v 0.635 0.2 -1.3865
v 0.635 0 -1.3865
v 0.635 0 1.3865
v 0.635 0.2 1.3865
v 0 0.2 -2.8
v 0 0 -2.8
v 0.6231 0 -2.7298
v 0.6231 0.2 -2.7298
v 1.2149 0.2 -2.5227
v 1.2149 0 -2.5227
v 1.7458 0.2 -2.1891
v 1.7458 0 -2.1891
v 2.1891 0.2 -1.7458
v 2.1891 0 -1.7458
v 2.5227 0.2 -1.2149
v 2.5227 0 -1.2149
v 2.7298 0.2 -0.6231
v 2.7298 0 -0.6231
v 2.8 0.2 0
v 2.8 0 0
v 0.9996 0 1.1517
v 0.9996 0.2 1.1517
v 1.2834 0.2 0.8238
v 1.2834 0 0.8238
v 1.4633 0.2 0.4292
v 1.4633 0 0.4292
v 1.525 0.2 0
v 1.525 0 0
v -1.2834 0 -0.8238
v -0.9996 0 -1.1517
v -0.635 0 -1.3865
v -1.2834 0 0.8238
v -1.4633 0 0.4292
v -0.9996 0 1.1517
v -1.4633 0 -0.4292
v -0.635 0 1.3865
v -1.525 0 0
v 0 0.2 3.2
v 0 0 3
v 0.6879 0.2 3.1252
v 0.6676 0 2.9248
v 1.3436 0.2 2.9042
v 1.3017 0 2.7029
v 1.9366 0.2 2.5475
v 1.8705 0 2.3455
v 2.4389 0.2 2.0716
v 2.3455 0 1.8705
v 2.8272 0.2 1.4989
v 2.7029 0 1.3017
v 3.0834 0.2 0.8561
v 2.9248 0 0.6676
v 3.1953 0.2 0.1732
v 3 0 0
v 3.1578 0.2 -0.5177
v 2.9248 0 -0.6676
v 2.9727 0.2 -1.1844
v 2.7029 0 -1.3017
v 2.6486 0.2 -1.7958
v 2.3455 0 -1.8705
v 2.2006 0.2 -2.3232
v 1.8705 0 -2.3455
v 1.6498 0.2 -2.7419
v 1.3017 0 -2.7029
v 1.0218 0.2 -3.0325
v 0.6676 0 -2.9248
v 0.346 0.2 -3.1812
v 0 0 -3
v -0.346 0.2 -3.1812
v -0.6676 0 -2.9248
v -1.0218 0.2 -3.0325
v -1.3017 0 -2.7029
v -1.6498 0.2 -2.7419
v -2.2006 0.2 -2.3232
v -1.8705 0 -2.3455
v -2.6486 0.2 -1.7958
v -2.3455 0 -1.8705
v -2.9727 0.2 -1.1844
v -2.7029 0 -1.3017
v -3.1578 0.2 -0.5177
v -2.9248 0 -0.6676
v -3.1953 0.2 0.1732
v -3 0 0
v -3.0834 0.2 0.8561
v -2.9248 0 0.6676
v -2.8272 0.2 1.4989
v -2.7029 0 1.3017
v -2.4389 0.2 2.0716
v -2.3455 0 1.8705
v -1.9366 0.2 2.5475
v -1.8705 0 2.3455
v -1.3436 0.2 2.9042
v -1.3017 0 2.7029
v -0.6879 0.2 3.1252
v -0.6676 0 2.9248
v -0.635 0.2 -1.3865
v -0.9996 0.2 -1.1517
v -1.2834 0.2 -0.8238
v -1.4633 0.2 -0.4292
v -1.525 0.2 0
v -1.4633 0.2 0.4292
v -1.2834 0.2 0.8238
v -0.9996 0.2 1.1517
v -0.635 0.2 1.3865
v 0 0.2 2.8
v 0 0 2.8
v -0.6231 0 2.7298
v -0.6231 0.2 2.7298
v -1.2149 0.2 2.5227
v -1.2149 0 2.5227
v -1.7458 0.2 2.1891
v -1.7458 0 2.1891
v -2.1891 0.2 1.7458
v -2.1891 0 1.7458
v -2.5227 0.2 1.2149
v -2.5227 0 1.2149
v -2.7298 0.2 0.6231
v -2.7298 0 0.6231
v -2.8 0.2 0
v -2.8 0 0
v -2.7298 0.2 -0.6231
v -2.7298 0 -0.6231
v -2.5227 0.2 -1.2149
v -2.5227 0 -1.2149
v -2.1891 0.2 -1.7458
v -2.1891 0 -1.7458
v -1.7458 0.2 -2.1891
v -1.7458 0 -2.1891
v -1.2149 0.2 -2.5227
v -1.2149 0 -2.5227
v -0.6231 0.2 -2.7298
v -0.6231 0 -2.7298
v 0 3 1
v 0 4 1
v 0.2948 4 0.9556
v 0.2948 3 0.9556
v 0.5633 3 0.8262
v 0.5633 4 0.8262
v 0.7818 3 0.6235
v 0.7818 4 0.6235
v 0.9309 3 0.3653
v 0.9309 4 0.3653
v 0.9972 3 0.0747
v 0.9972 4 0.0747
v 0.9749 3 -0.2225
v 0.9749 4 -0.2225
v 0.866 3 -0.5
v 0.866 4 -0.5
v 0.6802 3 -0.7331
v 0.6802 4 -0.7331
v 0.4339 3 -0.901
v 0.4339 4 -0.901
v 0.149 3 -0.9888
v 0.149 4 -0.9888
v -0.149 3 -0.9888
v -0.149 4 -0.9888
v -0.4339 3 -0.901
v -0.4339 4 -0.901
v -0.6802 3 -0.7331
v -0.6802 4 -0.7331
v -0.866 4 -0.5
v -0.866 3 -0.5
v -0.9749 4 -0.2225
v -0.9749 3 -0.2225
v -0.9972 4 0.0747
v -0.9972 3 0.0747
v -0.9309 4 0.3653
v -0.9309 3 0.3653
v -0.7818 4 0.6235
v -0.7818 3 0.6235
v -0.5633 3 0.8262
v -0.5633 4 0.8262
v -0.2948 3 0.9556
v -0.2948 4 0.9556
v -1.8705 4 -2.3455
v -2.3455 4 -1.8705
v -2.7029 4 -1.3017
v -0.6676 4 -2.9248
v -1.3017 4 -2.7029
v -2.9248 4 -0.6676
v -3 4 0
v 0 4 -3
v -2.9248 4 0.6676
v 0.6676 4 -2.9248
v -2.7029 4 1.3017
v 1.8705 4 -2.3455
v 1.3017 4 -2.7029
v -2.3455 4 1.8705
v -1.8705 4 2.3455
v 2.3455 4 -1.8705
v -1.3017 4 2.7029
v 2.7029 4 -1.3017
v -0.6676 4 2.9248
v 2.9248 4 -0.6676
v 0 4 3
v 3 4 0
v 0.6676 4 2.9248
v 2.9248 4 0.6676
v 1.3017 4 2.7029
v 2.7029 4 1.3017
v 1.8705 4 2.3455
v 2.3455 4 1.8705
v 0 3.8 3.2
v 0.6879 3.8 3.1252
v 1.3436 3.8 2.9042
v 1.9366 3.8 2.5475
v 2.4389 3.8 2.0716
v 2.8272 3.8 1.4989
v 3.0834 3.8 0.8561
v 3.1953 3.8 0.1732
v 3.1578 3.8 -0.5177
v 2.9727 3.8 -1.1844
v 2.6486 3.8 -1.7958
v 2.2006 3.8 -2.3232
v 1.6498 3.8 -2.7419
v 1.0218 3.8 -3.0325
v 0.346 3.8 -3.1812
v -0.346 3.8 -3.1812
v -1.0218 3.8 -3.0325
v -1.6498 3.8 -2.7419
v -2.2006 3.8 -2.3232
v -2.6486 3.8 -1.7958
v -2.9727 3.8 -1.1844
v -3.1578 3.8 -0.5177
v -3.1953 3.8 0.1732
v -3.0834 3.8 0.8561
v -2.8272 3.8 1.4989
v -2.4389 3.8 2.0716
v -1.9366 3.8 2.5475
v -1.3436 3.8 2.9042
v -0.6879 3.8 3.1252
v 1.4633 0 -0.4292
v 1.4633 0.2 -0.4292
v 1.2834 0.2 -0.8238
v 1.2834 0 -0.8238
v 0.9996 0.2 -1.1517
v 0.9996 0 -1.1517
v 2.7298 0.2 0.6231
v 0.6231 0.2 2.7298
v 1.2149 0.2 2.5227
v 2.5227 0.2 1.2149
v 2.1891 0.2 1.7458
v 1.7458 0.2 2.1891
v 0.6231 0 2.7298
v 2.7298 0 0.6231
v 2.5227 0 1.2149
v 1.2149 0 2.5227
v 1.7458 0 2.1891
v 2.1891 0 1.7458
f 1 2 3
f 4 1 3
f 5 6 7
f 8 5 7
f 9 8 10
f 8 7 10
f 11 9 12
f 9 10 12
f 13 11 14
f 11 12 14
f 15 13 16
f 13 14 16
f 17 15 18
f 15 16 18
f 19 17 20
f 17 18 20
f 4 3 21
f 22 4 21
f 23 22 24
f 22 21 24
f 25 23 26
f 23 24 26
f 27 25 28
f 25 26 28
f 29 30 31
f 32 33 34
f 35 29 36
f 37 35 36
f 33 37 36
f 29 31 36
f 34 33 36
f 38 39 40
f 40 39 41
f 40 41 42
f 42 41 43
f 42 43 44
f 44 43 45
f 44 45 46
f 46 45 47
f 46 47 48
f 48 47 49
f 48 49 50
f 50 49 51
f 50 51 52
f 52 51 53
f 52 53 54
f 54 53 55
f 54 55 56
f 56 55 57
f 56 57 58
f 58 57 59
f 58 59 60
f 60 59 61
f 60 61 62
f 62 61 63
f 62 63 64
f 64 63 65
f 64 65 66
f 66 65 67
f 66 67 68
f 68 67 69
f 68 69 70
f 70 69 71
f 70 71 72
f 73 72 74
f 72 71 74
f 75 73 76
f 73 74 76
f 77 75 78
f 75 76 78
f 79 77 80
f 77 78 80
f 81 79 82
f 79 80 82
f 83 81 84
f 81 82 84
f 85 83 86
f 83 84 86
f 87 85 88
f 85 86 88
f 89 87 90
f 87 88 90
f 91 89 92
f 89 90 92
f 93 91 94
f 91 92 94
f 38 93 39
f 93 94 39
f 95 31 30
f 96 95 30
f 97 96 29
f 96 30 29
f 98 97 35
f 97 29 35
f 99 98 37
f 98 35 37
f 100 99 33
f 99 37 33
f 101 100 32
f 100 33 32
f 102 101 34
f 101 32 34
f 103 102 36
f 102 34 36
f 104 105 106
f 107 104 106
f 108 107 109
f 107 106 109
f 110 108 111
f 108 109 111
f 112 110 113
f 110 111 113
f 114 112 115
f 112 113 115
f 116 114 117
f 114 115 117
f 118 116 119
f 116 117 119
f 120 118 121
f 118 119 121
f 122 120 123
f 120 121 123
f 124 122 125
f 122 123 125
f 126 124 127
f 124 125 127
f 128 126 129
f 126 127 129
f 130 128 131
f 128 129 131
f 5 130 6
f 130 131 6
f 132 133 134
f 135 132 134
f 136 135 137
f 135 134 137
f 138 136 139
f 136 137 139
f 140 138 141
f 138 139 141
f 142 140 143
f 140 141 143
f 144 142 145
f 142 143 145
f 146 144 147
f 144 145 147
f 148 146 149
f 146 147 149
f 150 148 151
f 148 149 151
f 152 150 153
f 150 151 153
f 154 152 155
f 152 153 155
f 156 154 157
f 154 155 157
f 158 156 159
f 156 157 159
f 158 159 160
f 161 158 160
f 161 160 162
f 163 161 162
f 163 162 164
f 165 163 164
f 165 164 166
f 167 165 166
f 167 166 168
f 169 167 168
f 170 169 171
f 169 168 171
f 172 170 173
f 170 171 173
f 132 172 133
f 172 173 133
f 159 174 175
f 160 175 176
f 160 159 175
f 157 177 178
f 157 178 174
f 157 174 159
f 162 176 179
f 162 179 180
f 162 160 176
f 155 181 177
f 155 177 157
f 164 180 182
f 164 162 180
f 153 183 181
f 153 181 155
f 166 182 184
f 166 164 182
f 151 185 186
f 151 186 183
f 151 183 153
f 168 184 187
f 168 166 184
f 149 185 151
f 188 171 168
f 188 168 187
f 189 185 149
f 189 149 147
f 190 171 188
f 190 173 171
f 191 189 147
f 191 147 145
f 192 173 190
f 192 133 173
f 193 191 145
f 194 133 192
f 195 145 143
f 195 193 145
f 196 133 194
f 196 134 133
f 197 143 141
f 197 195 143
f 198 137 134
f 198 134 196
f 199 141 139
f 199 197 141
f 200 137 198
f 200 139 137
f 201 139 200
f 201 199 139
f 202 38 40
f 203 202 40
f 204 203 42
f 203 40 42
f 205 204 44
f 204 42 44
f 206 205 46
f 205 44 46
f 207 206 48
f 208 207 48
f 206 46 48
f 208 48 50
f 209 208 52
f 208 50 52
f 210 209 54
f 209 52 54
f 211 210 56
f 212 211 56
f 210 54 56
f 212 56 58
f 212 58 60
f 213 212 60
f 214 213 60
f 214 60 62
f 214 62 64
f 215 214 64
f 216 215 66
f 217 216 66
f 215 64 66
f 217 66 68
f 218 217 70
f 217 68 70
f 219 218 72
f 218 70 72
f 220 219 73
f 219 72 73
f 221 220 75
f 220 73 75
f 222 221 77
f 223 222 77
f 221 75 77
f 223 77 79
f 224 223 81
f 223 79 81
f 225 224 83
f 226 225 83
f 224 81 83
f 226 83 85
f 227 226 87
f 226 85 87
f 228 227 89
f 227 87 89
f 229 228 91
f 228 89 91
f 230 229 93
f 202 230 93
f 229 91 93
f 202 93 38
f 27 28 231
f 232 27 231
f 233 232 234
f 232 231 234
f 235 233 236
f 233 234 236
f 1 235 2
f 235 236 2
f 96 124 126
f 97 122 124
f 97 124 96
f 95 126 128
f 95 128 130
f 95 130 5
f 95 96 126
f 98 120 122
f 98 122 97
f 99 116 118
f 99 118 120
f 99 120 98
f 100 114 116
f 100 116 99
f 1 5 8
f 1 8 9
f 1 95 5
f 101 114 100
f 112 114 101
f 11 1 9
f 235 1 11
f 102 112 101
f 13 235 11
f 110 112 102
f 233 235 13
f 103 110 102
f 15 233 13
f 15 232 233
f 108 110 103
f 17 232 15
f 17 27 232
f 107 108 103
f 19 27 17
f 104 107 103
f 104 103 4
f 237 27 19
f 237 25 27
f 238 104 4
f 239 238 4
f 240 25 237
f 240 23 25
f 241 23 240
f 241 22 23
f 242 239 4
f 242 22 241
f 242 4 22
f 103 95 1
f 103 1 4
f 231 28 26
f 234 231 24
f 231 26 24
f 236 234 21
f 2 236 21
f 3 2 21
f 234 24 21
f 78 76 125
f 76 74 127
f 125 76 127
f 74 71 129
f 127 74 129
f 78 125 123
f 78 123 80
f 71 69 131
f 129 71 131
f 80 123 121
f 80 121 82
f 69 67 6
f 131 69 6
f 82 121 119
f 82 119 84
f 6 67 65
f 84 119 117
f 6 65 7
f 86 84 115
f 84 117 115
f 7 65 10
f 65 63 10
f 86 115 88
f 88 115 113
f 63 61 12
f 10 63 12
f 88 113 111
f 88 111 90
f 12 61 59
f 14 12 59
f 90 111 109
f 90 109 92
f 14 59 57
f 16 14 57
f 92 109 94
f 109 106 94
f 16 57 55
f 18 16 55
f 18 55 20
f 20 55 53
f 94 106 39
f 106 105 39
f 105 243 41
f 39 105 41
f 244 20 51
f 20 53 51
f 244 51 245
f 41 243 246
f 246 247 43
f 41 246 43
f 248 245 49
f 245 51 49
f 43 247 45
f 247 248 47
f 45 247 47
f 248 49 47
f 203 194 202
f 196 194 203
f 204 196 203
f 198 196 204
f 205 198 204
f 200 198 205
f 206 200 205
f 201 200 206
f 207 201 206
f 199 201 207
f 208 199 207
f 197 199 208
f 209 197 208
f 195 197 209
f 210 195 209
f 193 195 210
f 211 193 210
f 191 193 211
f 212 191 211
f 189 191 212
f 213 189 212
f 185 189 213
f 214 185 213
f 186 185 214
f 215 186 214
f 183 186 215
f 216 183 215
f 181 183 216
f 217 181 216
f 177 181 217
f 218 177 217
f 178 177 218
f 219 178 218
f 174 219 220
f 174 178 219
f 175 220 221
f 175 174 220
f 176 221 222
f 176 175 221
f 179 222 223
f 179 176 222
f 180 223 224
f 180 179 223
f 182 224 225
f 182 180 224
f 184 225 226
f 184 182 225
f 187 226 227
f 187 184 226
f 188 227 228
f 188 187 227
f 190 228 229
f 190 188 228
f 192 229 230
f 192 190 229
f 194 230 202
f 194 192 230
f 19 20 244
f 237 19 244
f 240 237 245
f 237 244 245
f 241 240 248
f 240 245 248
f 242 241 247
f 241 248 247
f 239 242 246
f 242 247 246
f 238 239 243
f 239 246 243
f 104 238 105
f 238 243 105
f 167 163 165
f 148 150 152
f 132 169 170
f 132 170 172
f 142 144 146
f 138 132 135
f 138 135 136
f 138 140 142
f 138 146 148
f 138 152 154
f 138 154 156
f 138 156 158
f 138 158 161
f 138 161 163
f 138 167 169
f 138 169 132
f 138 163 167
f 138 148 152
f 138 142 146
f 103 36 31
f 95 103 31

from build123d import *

# Parameters (mm, degrees)
SKETCH1_R           = 3.2
BOSS_EXTRUDE1_DEPTH = 4
CHAMFER1_SIZE       = 0.2
SKETCH2_R           = 1
CUT_EXTRUDE1_DEPTH  = 1
SKETCH3_R           = 2.8
CUT_EXTRUDE2_DEPTH  = 0.2


with BuildPart() as part:
    # Sketch1 → Boss-Extrude1 (new body)
    with BuildSketch(Plane(origin=(0, 0, 0), x_dir=(1, 0, 0), z_dir=(0, 1, 0))):
        Circle(SKETCH1_R)
    extrude(amount=BOSS_EXTRUDE1_DEPTH)

    # Chamfer1
    chamfer1_edges = [part.edges().sort_by_distance(p)[0] for p in [
        (-3.2, 0, 0),
        (-3.2, 4, 0),
    ]]
    chamfer(chamfer1_edges, length=CHAMFER1_SIZE)

    # Sketch2 → Cut-Extrude1 (cut)
    with BuildSketch(Plane(origin=(0, 4, 0), x_dir=(1, 0, 0), z_dir=(0, 1, 0))):
        Circle(SKETCH2_R)
    extrude(amount=-CUT_EXTRUDE1_DEPTH, mode=Mode.SUBTRACT)

    # Sketch3 → Cut-Extrude2 (cut)
    with BuildSketch(Plane.XZ):
        Circle(SKETCH3_R)
        with BuildLine():
            Line((0.635, -1.386506401), (0.635, 1.386506401))
            ThreePointArc((0.635, 1.386506401), (1.525, 0), (0.635, -1.386506401))
        make_face(mode=Mode.SUBTRACT)
        with BuildLine():
            ThreePointArc((-0.635, -1.386506401), (-1.525, 0), (-0.635, 1.386506401))
            Line((-0.635, 1.386506401), (-0.635, -1.386506401))
        make_face(mode=Mode.SUBTRACT)
    extrude(amount=-CUT_EXTRUDE2_DEPTH, mode=Mode.SUBTRACT)


solid = part.part
